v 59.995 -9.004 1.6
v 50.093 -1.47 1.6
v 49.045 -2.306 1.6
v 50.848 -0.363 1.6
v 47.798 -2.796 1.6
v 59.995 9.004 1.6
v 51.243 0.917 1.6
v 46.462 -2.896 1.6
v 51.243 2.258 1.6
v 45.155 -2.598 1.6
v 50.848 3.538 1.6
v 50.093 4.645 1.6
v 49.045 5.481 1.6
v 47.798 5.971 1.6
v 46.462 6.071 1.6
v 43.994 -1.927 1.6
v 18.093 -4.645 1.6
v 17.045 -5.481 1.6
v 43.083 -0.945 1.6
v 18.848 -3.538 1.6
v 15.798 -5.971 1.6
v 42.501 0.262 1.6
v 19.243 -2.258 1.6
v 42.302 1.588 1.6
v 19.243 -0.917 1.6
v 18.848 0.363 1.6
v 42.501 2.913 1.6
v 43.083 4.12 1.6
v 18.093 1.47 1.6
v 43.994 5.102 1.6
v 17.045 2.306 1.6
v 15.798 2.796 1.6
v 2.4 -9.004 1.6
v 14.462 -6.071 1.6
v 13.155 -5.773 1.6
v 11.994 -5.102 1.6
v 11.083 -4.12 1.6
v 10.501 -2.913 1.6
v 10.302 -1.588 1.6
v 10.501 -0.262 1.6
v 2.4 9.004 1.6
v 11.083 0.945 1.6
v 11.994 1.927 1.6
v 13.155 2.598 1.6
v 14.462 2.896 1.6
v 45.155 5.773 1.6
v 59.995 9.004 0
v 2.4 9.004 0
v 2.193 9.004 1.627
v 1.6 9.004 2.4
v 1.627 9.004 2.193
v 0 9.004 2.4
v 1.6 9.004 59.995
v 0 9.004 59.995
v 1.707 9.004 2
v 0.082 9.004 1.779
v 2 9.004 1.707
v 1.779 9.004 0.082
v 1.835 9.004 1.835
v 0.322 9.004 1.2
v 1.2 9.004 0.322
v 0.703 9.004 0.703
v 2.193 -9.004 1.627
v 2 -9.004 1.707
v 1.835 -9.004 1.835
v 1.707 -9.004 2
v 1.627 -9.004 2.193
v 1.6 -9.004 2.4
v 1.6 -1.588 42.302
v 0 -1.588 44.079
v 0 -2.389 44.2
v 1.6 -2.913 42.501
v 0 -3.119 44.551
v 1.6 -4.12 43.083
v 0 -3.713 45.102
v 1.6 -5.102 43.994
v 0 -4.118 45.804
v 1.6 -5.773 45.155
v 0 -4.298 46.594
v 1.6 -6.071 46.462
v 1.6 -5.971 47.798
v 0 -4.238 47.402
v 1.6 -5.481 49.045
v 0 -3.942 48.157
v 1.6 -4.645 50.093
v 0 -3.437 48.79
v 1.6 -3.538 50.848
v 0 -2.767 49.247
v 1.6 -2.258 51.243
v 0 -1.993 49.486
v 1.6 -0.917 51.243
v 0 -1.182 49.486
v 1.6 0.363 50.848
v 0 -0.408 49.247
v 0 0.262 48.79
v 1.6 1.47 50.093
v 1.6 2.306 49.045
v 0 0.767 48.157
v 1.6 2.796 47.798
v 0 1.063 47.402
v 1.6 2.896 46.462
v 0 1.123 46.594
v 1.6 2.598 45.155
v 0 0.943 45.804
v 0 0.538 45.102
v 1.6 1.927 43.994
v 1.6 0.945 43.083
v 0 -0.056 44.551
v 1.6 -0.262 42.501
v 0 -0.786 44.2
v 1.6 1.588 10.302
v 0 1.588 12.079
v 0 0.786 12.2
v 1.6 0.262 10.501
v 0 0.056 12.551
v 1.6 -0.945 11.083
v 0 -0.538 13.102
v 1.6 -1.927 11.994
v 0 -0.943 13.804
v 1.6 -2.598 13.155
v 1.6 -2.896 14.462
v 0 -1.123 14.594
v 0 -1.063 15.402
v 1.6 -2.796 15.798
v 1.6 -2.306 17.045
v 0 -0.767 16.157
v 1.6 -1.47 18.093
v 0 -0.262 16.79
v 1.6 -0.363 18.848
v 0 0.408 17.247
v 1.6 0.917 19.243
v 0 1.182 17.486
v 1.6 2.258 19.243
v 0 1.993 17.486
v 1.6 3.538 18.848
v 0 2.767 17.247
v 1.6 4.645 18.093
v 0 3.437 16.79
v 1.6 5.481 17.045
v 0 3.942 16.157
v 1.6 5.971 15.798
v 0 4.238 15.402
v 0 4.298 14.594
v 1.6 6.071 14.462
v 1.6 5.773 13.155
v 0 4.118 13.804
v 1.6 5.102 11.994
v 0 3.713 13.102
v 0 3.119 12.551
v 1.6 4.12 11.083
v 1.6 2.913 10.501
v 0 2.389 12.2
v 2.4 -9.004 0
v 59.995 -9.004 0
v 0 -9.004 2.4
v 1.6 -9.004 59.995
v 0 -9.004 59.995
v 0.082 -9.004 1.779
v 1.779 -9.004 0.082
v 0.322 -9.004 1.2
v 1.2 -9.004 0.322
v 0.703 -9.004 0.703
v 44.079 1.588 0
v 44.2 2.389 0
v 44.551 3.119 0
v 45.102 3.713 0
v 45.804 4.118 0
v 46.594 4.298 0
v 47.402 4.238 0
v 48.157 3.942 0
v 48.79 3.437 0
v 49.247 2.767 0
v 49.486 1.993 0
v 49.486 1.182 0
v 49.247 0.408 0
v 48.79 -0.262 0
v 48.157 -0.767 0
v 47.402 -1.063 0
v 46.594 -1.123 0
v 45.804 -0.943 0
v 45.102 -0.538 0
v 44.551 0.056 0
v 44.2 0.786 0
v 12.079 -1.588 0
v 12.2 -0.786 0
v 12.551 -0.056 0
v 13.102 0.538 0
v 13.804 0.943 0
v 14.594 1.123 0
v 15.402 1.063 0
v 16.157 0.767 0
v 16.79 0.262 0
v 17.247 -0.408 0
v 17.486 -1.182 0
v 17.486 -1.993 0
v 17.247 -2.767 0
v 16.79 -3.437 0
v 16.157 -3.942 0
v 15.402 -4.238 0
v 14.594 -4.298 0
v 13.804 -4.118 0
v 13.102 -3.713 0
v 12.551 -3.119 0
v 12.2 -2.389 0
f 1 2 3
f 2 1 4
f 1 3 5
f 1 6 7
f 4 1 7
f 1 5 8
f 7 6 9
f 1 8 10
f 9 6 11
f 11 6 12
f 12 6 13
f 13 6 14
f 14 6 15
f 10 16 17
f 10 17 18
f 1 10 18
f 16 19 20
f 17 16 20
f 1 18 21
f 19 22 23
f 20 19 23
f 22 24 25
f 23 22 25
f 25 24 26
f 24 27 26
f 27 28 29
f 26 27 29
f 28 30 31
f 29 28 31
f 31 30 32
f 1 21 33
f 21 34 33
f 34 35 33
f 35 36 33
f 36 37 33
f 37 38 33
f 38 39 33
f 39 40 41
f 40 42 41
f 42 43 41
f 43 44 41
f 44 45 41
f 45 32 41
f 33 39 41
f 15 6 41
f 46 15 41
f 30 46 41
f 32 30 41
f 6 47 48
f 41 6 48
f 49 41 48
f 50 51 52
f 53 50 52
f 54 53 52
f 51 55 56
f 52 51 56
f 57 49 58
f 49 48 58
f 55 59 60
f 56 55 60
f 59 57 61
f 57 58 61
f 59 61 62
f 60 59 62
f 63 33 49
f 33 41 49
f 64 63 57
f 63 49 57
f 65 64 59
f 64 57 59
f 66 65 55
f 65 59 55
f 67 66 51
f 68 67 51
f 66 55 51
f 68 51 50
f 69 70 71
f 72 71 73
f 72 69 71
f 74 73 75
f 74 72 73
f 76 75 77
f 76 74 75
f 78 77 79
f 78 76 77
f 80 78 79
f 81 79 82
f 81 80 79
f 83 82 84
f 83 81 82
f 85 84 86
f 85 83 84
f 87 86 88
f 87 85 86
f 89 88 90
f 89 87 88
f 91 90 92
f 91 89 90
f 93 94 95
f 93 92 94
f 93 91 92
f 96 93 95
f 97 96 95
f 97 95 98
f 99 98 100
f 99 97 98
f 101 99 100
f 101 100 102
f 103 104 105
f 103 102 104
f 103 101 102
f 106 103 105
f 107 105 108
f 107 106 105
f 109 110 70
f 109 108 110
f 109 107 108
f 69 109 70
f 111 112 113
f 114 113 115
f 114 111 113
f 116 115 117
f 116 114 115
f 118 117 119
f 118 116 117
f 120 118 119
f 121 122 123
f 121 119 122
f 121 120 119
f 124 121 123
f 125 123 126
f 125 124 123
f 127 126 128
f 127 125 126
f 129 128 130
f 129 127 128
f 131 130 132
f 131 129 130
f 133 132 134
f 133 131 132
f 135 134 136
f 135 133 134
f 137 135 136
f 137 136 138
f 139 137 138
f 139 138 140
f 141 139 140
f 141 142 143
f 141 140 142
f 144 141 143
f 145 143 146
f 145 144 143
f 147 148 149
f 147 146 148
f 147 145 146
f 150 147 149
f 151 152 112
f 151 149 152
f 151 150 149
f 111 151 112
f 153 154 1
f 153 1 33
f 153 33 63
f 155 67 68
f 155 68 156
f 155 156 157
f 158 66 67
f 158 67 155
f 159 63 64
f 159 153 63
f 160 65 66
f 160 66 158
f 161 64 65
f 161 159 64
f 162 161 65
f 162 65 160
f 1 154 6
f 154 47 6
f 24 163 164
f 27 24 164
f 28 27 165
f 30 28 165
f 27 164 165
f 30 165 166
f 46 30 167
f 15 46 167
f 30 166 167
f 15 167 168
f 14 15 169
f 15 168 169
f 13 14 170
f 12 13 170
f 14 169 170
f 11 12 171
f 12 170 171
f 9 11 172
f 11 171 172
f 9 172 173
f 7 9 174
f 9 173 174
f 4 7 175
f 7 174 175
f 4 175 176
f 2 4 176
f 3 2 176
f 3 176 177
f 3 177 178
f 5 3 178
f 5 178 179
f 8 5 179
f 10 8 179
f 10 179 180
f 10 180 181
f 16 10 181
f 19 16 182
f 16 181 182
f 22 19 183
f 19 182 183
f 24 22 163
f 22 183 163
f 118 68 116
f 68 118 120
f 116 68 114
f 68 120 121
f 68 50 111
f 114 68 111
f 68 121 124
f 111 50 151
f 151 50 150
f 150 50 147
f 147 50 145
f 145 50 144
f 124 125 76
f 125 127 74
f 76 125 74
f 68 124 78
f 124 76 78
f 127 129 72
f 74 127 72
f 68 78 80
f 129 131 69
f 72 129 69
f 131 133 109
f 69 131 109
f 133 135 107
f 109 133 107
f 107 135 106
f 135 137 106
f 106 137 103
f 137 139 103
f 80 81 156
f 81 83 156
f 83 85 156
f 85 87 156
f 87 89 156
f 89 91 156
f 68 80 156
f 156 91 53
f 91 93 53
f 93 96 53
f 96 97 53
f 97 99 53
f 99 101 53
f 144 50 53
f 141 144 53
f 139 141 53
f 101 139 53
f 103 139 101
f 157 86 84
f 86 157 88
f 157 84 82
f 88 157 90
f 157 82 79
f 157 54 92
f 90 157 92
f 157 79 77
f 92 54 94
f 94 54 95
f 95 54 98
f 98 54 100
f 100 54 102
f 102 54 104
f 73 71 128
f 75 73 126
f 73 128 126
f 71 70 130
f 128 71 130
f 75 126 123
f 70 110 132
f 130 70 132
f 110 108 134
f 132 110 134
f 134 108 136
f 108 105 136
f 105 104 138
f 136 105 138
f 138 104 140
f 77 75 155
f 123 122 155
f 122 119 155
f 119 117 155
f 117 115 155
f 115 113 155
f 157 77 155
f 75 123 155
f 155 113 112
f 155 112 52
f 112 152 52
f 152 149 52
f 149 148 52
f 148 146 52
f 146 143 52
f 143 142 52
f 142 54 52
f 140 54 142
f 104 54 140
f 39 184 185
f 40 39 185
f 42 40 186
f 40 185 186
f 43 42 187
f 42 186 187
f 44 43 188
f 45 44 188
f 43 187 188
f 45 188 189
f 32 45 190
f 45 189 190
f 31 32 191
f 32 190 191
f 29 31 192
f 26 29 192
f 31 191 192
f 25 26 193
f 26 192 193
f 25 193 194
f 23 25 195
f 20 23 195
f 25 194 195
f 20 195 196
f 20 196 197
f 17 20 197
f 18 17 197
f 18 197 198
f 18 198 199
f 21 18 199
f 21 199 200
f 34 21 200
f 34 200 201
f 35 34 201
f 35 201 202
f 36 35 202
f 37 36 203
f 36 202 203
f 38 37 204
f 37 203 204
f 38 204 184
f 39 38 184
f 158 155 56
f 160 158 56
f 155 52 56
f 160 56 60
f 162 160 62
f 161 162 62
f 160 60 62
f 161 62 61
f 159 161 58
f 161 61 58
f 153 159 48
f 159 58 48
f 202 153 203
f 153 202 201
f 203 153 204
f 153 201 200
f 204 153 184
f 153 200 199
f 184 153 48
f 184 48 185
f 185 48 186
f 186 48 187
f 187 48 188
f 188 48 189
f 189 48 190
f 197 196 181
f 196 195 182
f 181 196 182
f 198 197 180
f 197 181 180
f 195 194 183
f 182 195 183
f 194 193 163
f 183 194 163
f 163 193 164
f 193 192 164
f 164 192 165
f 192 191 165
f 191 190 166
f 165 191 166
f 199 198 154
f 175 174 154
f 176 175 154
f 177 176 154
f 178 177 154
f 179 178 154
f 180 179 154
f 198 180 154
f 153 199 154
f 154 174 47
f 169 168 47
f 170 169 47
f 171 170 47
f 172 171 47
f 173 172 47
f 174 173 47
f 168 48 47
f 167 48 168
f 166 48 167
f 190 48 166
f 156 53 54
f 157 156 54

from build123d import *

# Parameters (mm, degrees)
EXTRUDE_THIN2_DEPTH            = 9.0043
SKETCH4_R                      = 2.2479
CUT_EXTRUDE2_DEPTH             = 86.321916719
CHAMFER1_SIZE                  = 2.2479
CHAMFER1_SIZE_2                = 2.024018251
CIRPATTERN2_COUNT              = 2
CIRPATTERN2_ANGLE              = 180
CHAMFER1_OF_CIRPATTERN2_SIZE   = 2.024018251
CHAMFER1_OF_CIRPATTERN2_SIZE_2 = 2.2479


with BuildPart() as part:
    # Sketch3 → Extrude-Thin2 (new, symmetric)
    with BuildSketch(Plane(origin=(0, 0, 0), x_dir=(1, 0, 0), z_dir=(0, 1, 0))):
        with BuildLine():
            Line((0, -59.9948), (0, -2.4003))
            ThreePointArc((0, -2.4003), (0.703031593, -0.703031593), (2.4003, 0))
            Line((2.4003, 0), (59.9948, 0))
            Line((59.9948, 0), (59.9948, -1.6002))
            Line((59.9948, -1.6002), (2.4003, -1.6002))
            ThreePointArc((2.4003, -1.6002), (1.834543864, -1.834543864), (1.6002, -2.4003))
            Line((1.6002, -2.4003), (1.6002, -59.9948))
            Line((1.6002, -59.9948), (0, -59.9948))
        make_face()
    extrude(amount=EXTRUDE_THIN2_DEPTH, both=True)

    # Sketch4 → Cut-Extrude2 (cut, through all)
    with BuildSketch(Plane.XY):
        with Locations(Location((46.7975, 1.5875, 0), (0, 0, 180))):
            Circle(SKETCH4_R)
        with Locations(Location((14.7975, -1.5875, 0), (0, 0, 180))):
            Circle(SKETCH4_R)
    cut_extrude2 = extrude(amount=CUT_EXTRUDE2_DEPTH, mode=Mode.SUBTRACT)

    # Chamfer1
    # the kernel refuses this chamfer: 2.2479, 2.024018251 mm, written as the material it takes off along each edge
    with BuildSketch(Plane(origin=(46.7975, 1.5875, 1.6002), x_dir=(-1, 0, 0), z_dir=(0, -1, 0))) as chamfer1_piece_1:
        Polygon((2.2479 + CHAMFER1_SIZE, 0), (2.2479, CHAMFER1_SIZE_2), (2.2479, 0), align=None)
    revolve(axis=Axis((46.7975, 1.5875, 1.6002), (0, 0, -1)), mode=Mode.SUBTRACT)
    with BuildSketch(Plane(origin=(14.7975, -1.5875, 1.6002), x_dir=(-1, 0, 0), z_dir=(0, -1, 0))) as chamfer1_piece_2:
        Polygon((2.2479 + CHAMFER1_SIZE, 0), (2.2479, CHAMFER1_SIZE_2), (2.2479, 0), align=None)
    revolve(axis=Axis((14.7975, -1.5875, 1.6002), (0, 0, -1)), mode=Mode.SUBTRACT)

    # CirPattern2: Cut-Extrude2 ×2 about axis
    cirpattern2_axis = Axis((0, 0, 0), (0.7071067811865462, 0, 0.7071067811865489))
    for i in range(1, CIRPATTERN2_COUNT):
        add(cut_extrude2.rotate(cirpattern2_axis, i * CIRPATTERN2_ANGLE / (CIRPATTERN2_COUNT - 1)), mode=Mode.SUBTRACT)

    # Chamfer1 of CirPattern2
    # the kernel refuses this chamfer: 2.2479, 2.024018251 mm, written as the material it takes off along each edge
    with BuildSketch(Plane(origin=(1.6002, -1.5875, 46.7975), x_dir=(0, 0, -1), z_dir=(0, 1, 0))) as chamfer1_of_cirpattern2_piece_1:
        Polygon((2.2479, CHAMFER1_OF_CIRPATTERN2_SIZE), (2.2479 + CHAMFER1_OF_CIRPATTERN2_SIZE_2, 0), (2.2479, 0), align=None)
    revolve(axis=Axis((1.6002, -1.5875, 46.7975), (-1, 0, 0)), mode=Mode.SUBTRACT)
    with BuildSketch(Plane(origin=(1.6002, 1.5875, 14.7975), x_dir=(0, 0, -1), z_dir=(0, 1, 0))) as chamfer1_of_cirpattern2_piece_2:
        Polygon((2.2479, CHAMFER1_OF_CIRPATTERN2_SIZE), (2.2479 + CHAMFER1_OF_CIRPATTERN2_SIZE_2, 0), (2.2479, 0), align=None)
    revolve(axis=Axis((1.6002, 1.5875, 14.7975), (-1, 0, 0)), mode=Mode.SUBTRACT)


solid = part.part
